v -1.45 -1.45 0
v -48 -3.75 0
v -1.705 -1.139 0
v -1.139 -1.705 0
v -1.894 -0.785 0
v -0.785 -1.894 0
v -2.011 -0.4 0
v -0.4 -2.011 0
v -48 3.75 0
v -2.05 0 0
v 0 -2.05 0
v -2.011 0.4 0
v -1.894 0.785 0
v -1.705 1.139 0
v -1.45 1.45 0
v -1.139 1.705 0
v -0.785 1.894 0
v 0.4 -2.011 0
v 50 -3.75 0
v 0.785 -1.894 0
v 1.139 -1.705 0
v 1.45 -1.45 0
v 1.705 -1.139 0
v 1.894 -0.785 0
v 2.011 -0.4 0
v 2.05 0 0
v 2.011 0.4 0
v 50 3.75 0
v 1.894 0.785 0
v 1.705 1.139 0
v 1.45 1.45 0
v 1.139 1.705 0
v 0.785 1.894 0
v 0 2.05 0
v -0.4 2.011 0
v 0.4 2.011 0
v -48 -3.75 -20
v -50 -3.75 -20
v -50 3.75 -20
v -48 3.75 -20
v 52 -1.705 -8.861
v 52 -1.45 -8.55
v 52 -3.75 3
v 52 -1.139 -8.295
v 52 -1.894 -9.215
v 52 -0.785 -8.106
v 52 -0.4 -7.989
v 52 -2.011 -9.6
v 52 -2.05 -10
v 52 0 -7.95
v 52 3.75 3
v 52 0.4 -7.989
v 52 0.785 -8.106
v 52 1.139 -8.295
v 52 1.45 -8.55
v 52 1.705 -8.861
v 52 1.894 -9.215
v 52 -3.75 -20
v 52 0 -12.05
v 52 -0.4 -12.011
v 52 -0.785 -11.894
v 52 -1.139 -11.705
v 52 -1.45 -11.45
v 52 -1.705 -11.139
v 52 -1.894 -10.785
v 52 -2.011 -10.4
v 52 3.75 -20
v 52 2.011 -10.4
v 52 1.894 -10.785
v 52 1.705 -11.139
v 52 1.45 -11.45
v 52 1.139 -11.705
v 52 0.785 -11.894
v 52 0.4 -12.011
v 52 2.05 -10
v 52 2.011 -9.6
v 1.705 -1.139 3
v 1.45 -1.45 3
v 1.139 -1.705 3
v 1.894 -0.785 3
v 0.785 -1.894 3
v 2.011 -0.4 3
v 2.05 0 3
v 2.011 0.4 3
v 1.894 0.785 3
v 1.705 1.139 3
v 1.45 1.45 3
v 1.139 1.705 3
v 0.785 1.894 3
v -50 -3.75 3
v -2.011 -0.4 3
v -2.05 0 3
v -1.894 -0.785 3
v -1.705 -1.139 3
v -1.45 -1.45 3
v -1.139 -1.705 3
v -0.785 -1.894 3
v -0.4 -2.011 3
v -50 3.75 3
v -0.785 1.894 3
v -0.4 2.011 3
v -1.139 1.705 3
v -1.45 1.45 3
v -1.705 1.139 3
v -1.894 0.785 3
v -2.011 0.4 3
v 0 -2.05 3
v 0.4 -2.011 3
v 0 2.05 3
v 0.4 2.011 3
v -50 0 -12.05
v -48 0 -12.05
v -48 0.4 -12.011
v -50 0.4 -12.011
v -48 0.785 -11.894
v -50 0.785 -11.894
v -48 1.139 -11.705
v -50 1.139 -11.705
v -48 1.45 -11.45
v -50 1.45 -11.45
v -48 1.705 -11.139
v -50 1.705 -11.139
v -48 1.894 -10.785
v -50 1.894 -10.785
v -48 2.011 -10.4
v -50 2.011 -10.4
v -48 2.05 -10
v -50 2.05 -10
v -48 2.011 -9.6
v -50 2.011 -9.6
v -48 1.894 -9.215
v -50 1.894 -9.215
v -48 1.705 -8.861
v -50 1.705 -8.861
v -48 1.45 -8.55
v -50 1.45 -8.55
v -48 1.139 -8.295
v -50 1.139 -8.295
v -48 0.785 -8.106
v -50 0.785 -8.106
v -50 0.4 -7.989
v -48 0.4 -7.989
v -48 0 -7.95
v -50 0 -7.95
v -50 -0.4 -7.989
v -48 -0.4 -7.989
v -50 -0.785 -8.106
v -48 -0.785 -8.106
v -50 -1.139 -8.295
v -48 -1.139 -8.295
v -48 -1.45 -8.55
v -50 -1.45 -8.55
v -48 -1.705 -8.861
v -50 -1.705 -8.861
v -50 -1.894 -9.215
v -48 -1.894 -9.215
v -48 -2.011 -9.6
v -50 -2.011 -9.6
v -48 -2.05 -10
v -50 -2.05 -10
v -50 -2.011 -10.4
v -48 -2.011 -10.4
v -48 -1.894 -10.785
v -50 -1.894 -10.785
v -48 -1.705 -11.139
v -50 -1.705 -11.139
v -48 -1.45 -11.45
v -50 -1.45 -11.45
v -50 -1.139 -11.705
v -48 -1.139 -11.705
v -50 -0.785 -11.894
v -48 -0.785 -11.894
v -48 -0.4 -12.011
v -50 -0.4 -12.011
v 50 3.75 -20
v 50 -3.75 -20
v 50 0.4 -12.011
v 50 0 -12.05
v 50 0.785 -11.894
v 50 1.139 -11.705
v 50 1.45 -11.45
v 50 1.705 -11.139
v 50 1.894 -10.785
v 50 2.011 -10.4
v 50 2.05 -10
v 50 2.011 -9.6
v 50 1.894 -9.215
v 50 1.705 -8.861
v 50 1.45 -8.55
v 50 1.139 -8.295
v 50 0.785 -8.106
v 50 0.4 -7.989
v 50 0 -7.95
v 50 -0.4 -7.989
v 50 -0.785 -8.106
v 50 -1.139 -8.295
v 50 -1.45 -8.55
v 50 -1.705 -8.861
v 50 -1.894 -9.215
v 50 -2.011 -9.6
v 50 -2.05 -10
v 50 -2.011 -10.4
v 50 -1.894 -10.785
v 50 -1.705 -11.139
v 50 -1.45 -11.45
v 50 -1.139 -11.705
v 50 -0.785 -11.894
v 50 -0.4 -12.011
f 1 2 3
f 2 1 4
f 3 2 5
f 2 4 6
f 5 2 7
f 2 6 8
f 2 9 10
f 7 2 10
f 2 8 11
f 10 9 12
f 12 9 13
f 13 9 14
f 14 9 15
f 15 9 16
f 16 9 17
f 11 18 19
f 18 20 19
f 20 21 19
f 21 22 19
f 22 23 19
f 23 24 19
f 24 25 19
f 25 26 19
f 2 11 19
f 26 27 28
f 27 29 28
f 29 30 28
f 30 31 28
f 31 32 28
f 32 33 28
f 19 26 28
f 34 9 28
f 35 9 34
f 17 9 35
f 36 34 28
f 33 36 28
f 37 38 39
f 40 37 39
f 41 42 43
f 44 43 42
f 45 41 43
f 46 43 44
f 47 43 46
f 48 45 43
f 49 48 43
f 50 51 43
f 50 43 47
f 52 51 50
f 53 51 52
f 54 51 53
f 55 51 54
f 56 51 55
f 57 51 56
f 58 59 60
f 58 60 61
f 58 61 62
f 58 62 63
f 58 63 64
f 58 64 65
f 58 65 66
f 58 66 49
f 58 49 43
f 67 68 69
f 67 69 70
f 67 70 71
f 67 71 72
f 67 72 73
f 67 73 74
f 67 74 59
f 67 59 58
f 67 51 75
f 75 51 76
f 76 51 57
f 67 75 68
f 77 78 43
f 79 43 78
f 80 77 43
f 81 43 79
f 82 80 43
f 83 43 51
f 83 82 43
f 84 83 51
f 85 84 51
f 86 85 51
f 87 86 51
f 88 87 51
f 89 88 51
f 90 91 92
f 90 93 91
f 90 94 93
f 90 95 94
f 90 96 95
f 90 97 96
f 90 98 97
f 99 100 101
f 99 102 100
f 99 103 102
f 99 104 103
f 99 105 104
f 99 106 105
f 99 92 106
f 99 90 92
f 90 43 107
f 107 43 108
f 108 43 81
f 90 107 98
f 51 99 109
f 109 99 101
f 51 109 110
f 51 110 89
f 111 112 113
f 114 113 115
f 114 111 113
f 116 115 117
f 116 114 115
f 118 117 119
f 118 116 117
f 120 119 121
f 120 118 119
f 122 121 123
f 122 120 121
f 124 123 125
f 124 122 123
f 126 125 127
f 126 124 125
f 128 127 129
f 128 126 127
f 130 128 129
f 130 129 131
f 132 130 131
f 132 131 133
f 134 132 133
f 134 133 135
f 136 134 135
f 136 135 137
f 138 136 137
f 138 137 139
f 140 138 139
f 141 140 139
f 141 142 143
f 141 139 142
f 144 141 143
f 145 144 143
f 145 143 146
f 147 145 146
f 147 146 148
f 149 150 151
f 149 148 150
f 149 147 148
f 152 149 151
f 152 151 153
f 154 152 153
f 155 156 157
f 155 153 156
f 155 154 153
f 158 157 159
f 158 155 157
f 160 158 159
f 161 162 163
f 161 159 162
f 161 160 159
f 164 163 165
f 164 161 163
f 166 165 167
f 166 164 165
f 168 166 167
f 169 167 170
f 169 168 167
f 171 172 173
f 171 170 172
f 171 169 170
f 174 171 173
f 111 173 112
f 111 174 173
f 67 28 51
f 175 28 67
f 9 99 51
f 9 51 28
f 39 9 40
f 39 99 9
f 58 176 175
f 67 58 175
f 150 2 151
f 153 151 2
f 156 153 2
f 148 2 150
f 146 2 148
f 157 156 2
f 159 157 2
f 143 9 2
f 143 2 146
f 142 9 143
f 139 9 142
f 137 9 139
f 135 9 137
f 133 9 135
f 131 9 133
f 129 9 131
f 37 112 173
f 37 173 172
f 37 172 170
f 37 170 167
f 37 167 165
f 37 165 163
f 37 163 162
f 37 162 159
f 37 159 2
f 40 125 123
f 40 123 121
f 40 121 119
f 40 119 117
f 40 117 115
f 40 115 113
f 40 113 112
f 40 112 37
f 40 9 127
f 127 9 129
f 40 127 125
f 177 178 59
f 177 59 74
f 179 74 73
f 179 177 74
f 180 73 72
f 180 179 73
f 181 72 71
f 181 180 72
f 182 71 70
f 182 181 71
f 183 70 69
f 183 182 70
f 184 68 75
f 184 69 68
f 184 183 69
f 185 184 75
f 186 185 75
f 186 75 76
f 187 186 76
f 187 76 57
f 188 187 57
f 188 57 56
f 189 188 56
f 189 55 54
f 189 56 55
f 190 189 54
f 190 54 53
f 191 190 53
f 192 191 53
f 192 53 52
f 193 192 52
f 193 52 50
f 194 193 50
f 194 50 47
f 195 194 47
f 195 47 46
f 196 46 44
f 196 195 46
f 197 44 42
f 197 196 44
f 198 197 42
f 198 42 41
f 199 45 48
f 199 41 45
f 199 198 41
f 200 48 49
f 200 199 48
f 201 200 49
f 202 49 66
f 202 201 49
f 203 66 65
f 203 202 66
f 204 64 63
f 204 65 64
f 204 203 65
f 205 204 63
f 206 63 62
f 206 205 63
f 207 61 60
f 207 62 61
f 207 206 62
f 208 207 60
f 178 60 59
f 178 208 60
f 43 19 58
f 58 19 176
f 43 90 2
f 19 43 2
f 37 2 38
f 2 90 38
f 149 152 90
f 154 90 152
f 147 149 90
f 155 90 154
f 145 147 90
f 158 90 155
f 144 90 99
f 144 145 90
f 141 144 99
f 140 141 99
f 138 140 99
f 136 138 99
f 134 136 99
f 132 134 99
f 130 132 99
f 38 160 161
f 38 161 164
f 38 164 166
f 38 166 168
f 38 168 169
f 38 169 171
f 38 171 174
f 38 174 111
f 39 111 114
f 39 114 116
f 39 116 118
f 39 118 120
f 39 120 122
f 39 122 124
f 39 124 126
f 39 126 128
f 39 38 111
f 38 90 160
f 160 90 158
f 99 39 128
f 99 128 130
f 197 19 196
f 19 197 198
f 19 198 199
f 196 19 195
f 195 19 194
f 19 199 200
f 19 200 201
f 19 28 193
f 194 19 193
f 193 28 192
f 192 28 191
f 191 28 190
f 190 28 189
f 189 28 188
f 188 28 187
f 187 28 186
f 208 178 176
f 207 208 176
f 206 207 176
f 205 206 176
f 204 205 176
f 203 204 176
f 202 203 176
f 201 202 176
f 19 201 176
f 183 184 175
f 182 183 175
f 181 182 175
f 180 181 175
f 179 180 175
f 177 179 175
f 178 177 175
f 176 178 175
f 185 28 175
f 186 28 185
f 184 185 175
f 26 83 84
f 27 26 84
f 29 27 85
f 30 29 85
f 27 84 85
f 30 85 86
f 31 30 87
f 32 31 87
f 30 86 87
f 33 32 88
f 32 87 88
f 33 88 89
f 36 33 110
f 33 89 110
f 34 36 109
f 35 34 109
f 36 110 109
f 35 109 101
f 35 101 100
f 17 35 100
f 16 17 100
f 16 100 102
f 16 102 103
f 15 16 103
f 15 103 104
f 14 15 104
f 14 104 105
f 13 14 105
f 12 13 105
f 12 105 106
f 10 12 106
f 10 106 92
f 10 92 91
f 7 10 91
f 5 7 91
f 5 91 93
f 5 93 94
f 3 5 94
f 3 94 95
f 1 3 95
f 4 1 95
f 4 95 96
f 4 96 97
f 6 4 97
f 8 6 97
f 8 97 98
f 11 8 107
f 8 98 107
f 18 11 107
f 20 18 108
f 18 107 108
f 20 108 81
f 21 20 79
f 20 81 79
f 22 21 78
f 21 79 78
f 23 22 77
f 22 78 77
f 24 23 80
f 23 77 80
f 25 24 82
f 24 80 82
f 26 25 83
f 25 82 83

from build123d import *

# Parameters (mm, degrees)
SKETCH1_W           = 100
SKETCH1_H           = 7.5
BOSS_EXTRUDE1_DEPTH = 3
BOSS_EXTRUDE2_START = 50
SKETCH2_W           = 23
SKETCH2_H           = 7.5
BOSS_EXTRUDE2_DEPTH = 2
BOSS_EXTRUDE3_START = -50
SKETCH2_2_W         = 23
SKETCH2_2_H         = 7.5
BOSS_EXTRUDE3_DEPTH = 2
CUT_EXTRUDE1_START  = -50
SKETCH3_R           = 2.05
CUT_EXTRUDE1_DEPTH  = 103
CUT_EXTRUDE2_START  = 3
SKETCH4_R           = 2.05
CUT_EXTRUDE2_DEPTH  = 24


with BuildPart() as part:
    # Sketch1 → Boss-Extrude1 (new body)
    with BuildSketch(Plane.XY):
        Rectangle(SKETCH1_W, SKETCH1_H)
    extrude(amount=BOSS_EXTRUDE1_DEPTH)

    # Sketch2 → Boss-Extrude2 (add)
    with BuildSketch(Plane(origin=(0, 0, 0), x_dir=(0, 0, -1), z_dir=(1, 0, 0)).offset(BOSS_EXTRUDE2_START)):
        with Locations((8.5, 0)):
            Rectangle(SKETCH2_W, SKETCH2_H)
    extrude(amount=BOSS_EXTRUDE2_DEPTH)

    # Sketch2<2> → Boss-Extrude3 (add)
    with BuildSketch(Plane(origin=(0, 0, 0), x_dir=(0, 0, -1), z_dir=(1, 0, 0)).offset(BOSS_EXTRUDE3_START)):
        with Locations((8.5, 0)):
            Rectangle(SKETCH2_2_W, SKETCH2_2_H)
    extrude(amount=BOSS_EXTRUDE3_DEPTH)

    # Sketch3 → Cut-Extrude1 (cut, through all)
    with BuildSketch(Plane(origin=(0, 0, 0), x_dir=(0, 0, -1), z_dir=(1, 0, 0)).offset(CUT_EXTRUDE1_START)):
        with Locations((10, 0)):
            Circle(SKETCH3_R)
    extrude(amount=CUT_EXTRUDE1_DEPTH, mode=Mode.SUBTRACT)

    # Sketch4 → Cut-Extrude2 (cut, through all)
    with BuildSketch(Plane.XY.offset(CUT_EXTRUDE2_START)):
        Circle(SKETCH4_R)
    extrude(amount=-CUT_EXTRUDE2_DEPTH, mode=Mode.SUBTRACT)


solid = part.part
